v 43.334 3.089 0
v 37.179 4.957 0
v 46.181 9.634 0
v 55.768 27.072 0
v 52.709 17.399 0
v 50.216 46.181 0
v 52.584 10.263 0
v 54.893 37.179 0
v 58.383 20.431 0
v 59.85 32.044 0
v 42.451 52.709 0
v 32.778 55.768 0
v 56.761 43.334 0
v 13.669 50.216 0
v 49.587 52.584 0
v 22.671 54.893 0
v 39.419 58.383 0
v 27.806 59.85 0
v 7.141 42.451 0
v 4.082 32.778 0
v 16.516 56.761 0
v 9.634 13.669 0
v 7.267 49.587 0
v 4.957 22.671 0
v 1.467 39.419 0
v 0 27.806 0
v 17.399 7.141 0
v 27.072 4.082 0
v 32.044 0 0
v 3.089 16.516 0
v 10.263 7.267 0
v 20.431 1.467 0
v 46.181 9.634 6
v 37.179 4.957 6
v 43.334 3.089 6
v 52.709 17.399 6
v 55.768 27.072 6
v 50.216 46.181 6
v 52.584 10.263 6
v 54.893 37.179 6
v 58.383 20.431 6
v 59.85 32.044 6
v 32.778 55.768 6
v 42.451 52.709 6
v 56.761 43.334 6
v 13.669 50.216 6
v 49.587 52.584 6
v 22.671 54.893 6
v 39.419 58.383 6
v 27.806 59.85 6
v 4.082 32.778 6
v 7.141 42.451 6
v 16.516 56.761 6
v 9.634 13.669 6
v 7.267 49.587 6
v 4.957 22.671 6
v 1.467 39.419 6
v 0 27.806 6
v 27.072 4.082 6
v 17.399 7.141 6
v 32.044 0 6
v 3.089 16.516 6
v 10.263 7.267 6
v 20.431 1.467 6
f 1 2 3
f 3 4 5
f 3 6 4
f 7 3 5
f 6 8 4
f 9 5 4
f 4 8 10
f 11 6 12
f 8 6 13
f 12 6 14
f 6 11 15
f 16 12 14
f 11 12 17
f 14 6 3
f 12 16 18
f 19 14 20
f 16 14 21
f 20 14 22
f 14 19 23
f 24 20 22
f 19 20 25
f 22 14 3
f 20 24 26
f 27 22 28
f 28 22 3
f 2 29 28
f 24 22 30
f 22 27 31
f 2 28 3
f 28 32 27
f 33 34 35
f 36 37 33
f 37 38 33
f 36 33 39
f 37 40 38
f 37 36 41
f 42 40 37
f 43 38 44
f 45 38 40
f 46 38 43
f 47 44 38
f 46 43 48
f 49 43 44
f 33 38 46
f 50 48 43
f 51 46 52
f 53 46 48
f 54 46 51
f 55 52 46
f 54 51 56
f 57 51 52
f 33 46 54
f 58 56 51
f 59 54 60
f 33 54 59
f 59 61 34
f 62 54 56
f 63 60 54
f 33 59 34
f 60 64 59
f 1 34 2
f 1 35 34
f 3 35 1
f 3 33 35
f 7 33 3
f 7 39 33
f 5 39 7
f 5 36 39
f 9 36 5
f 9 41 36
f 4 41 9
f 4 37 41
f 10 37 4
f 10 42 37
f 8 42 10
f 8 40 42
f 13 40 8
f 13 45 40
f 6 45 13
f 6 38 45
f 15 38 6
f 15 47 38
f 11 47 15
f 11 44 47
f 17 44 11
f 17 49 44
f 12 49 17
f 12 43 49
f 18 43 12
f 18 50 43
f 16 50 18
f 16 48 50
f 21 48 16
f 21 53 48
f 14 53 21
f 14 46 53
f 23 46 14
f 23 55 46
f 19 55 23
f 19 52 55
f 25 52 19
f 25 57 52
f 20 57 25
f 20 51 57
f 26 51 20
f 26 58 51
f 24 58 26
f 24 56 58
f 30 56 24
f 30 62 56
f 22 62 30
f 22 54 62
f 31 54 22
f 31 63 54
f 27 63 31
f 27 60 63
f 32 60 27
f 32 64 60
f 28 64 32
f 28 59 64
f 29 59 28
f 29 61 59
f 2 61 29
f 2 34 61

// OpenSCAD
$fn = 32;

// ----------------------------------------------------------------------
// Chain sprocket: 16 teeth, 26 mm root radius
// ----------------------------------------------------------------------

// --- parameters (mm) ---
profile_height = 6;       // extrusion height
profile_points = 32;      // points of the closed outline

profile = [[55.768, 27.072], [59.85, 32.044], [54.893, 37.179], [56.761, 43.334], [50.216, 46.181], [49.587, 52.584], [42.451, 52.709], [39.419, 58.383], [32.778, 55.768], [27.806, 59.85], [22.671, 54.893], [16.516, 56.761], [13.669, 50.216], [7.267, 49.587], [7.141, 42.451], [1.467, 39.419], [4.082, 32.778], [0, 27.806], [4.957, 22.671], [3.089, 16.516], [9.634, 13.669], [10.263, 7.267], [17.399, 7.141], [20.431, 1.467], [27.072, 4.082], [32.044, 0], [37.179, 4.957], [43.334, 3.089], [46.181, 9.634], [52.584, 10.263], [52.709, 17.399], [58.383, 20.431]];  // single closed polygon, 32 points, counter clockwise

// --- the one profile operation ---
linear_extrude(height = profile_height) polygon(points = profile);
